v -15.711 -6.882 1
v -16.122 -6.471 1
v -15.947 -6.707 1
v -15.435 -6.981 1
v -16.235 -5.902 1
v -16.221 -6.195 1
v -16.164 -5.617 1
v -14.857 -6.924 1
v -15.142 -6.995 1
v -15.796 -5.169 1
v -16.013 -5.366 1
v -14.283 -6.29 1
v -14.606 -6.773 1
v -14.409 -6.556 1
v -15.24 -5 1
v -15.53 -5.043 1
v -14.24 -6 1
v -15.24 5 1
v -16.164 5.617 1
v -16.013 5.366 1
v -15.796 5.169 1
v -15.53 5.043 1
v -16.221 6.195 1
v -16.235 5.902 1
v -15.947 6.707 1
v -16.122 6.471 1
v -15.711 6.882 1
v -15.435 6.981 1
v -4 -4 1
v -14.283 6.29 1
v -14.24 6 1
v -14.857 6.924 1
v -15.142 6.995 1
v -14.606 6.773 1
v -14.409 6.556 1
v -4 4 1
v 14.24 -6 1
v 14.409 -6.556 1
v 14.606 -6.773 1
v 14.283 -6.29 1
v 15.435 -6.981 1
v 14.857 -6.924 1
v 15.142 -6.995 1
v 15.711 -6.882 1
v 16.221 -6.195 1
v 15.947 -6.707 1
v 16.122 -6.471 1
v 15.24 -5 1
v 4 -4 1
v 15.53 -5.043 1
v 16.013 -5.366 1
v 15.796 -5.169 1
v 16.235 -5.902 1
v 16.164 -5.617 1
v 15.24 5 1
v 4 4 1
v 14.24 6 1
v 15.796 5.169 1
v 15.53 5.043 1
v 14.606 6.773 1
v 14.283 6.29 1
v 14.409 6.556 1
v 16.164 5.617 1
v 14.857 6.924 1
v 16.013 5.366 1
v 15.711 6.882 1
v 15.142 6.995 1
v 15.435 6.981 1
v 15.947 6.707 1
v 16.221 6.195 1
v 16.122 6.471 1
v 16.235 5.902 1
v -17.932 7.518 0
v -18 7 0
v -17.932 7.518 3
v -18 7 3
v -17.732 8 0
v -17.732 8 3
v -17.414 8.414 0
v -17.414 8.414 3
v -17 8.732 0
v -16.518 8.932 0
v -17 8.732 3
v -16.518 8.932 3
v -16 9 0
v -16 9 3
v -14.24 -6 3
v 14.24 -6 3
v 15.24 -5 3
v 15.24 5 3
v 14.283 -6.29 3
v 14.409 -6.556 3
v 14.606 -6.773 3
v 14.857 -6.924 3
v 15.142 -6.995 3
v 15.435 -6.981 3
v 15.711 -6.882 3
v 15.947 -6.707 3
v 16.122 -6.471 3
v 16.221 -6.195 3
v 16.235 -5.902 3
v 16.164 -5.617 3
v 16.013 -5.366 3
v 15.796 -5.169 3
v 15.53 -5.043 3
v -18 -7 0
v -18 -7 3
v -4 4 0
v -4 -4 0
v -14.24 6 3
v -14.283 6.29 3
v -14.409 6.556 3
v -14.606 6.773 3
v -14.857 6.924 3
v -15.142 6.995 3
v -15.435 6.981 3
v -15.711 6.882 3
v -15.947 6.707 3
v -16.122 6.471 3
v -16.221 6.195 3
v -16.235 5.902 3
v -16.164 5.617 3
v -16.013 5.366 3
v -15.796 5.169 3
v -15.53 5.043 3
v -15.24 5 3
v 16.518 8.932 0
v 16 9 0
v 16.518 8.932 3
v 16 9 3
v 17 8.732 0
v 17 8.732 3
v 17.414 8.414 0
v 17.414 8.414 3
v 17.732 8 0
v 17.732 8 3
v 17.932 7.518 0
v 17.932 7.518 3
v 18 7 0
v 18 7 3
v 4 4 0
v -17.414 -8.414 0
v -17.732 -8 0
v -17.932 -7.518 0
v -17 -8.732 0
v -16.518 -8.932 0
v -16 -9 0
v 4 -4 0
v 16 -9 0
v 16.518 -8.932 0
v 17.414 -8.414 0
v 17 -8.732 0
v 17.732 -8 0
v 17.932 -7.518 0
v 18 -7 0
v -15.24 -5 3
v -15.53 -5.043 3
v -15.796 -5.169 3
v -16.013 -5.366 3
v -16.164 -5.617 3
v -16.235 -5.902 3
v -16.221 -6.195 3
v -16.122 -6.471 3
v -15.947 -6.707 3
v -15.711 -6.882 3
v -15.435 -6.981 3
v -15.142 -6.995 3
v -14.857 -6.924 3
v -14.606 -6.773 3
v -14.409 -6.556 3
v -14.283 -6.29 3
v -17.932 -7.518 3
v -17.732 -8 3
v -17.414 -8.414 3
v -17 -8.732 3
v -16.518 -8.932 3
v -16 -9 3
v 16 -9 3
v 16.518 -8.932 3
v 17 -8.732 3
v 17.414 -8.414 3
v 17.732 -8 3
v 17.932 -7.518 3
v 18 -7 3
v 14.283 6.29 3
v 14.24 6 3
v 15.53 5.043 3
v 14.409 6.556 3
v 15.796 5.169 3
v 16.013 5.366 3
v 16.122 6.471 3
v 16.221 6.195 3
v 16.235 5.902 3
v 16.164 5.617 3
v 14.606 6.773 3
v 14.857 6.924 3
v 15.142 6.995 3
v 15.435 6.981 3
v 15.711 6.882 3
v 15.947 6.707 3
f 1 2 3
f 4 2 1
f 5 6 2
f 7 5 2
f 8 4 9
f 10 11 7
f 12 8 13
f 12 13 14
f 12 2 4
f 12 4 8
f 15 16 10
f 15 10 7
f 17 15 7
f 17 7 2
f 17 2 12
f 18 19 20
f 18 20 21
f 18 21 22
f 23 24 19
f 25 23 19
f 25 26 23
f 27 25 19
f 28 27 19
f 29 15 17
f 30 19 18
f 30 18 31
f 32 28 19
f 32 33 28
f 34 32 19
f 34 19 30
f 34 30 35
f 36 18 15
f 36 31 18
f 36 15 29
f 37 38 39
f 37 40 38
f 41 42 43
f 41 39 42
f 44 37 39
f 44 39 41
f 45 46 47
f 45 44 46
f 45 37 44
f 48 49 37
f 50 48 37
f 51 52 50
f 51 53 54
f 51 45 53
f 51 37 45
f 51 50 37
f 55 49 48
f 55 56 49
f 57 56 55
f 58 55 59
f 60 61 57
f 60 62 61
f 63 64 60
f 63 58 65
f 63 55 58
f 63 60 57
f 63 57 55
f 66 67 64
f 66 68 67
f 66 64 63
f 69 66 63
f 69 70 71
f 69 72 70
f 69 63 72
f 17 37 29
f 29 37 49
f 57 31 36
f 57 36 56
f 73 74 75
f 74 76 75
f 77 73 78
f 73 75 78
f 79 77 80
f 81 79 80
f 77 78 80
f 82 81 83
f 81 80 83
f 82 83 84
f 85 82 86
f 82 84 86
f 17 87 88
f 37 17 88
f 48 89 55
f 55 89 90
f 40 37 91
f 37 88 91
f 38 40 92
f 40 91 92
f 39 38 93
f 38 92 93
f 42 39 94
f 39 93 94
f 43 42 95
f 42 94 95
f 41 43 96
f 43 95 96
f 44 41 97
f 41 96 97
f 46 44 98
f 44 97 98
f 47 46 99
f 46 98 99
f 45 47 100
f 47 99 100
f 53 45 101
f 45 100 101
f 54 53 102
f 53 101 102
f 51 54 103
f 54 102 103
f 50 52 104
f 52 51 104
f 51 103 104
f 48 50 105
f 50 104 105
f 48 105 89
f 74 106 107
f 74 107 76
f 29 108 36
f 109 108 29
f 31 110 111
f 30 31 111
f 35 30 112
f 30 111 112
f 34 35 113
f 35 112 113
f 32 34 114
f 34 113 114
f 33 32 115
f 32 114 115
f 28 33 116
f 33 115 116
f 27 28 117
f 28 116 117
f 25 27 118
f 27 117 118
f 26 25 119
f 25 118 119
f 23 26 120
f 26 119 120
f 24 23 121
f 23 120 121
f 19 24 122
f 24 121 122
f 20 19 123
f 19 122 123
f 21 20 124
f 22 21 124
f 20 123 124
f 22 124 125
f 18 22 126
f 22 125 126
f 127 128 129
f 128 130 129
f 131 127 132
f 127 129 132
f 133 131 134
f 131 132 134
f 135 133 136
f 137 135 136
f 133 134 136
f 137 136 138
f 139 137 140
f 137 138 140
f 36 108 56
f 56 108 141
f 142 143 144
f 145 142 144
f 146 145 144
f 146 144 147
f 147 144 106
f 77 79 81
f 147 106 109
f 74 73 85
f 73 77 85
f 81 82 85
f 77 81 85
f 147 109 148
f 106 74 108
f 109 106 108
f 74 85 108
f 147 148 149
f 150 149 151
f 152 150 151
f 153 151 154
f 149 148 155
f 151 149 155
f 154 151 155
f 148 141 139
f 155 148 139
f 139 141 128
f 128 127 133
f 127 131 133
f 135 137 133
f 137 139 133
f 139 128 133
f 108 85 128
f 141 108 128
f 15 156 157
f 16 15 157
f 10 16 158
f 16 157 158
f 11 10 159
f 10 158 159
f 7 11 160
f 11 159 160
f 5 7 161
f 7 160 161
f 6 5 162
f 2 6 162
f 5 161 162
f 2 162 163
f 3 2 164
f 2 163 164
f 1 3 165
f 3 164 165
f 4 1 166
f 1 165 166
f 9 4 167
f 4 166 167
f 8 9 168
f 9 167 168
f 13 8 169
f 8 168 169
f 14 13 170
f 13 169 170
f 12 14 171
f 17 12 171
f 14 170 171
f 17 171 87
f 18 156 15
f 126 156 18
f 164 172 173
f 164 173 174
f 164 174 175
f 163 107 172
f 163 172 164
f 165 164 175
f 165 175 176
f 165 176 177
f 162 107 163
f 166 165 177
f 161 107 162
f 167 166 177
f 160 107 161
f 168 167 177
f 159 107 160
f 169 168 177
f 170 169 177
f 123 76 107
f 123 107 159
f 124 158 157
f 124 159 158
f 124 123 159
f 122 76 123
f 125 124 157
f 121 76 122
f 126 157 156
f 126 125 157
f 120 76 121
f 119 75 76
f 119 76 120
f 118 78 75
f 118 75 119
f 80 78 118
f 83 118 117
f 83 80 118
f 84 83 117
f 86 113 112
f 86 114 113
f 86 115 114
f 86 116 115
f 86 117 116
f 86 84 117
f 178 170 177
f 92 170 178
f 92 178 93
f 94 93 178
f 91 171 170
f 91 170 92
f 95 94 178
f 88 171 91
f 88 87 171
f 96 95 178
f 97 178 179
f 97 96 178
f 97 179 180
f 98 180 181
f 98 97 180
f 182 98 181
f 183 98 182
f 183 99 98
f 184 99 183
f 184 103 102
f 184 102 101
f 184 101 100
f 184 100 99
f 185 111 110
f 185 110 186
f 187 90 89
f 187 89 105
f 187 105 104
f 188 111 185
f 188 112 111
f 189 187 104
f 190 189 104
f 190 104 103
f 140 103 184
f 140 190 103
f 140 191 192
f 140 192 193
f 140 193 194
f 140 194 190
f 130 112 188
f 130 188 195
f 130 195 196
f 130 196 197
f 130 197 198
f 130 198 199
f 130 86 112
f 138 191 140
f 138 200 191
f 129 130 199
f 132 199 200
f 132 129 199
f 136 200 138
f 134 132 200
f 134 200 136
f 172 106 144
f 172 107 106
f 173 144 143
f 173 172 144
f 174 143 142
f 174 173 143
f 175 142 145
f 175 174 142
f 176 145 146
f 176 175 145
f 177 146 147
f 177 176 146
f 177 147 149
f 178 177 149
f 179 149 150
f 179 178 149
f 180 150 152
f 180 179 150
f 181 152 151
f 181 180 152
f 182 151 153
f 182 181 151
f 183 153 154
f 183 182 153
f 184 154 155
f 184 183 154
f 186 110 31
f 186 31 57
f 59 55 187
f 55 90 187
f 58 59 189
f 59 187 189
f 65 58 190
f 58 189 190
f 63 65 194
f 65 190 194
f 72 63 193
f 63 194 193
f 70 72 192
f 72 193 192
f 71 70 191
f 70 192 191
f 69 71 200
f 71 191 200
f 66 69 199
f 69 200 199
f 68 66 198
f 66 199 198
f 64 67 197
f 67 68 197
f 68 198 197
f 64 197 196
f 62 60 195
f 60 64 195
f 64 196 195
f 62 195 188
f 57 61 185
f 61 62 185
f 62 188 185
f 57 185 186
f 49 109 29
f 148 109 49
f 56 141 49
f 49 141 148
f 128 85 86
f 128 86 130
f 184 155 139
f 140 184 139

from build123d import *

# Parameters (mm, degrees)
F0_W     = 36
F0_H     = 18
F1_DEPTH = 3
F2_W     = 30.48
F2_H     = 12
F3_DEPTH = 2
F4_W     = 8
F4_H     = 8
F5_DEPTH = 3.001
F6_R     = 2
F7_R     = 1
F8_DEPTH = 2


with BuildPart() as f1:
    # F0 (on Top) → F1 (new body)
    with BuildSketch(Plane.XY):
        Rectangle(F0_W, F0_H)
    extrude(amount=F1_DEPTH)

    # F2 (on face) → F3 (cut)
    with BuildSketch(Plane.XY.offset(3)):
        Rectangle(F2_W, F2_H)
    extrude(amount=-F3_DEPTH, mode=Mode.SUBTRACT)

    # F4 (on face) → F5 (cut, through all)
    with BuildSketch(Plane(origin=(0, 0, 0), x_dir=(1, 0, 0), z_dir=(0, 0, -1))):
        Rectangle(F4_W, F4_H)
    extrude(amount=-F5_DEPTH, mode=Mode.SUBTRACT)

    # F6
    f6_edges = [f1.edges().sort_by_distance(p)[0] for p in [
        (-18, -9, 1.5),
        (-18, 9, 1.5),
        (18, -9, 1.5),
        (18, 9, 1.5),
    ]]
    fillet(f6_edges, radius=F6_R)

    # F7 (on face) → F8 (cut)
    with BuildSketch(Plane.XY.offset(3)):
        with Locations((-15.24, 6)):
            Circle(F7_R)
        with Locations((-15.24, -6)):
            Circle(F7_R)
        with Locations((15.24, 6)):
            Circle(F7_R)
        with Locations((15.24, -6)):
            Circle(F7_R)
    extrude(amount=-F8_DEPTH, mode=Mode.SUBTRACT)


solid = f1.part
